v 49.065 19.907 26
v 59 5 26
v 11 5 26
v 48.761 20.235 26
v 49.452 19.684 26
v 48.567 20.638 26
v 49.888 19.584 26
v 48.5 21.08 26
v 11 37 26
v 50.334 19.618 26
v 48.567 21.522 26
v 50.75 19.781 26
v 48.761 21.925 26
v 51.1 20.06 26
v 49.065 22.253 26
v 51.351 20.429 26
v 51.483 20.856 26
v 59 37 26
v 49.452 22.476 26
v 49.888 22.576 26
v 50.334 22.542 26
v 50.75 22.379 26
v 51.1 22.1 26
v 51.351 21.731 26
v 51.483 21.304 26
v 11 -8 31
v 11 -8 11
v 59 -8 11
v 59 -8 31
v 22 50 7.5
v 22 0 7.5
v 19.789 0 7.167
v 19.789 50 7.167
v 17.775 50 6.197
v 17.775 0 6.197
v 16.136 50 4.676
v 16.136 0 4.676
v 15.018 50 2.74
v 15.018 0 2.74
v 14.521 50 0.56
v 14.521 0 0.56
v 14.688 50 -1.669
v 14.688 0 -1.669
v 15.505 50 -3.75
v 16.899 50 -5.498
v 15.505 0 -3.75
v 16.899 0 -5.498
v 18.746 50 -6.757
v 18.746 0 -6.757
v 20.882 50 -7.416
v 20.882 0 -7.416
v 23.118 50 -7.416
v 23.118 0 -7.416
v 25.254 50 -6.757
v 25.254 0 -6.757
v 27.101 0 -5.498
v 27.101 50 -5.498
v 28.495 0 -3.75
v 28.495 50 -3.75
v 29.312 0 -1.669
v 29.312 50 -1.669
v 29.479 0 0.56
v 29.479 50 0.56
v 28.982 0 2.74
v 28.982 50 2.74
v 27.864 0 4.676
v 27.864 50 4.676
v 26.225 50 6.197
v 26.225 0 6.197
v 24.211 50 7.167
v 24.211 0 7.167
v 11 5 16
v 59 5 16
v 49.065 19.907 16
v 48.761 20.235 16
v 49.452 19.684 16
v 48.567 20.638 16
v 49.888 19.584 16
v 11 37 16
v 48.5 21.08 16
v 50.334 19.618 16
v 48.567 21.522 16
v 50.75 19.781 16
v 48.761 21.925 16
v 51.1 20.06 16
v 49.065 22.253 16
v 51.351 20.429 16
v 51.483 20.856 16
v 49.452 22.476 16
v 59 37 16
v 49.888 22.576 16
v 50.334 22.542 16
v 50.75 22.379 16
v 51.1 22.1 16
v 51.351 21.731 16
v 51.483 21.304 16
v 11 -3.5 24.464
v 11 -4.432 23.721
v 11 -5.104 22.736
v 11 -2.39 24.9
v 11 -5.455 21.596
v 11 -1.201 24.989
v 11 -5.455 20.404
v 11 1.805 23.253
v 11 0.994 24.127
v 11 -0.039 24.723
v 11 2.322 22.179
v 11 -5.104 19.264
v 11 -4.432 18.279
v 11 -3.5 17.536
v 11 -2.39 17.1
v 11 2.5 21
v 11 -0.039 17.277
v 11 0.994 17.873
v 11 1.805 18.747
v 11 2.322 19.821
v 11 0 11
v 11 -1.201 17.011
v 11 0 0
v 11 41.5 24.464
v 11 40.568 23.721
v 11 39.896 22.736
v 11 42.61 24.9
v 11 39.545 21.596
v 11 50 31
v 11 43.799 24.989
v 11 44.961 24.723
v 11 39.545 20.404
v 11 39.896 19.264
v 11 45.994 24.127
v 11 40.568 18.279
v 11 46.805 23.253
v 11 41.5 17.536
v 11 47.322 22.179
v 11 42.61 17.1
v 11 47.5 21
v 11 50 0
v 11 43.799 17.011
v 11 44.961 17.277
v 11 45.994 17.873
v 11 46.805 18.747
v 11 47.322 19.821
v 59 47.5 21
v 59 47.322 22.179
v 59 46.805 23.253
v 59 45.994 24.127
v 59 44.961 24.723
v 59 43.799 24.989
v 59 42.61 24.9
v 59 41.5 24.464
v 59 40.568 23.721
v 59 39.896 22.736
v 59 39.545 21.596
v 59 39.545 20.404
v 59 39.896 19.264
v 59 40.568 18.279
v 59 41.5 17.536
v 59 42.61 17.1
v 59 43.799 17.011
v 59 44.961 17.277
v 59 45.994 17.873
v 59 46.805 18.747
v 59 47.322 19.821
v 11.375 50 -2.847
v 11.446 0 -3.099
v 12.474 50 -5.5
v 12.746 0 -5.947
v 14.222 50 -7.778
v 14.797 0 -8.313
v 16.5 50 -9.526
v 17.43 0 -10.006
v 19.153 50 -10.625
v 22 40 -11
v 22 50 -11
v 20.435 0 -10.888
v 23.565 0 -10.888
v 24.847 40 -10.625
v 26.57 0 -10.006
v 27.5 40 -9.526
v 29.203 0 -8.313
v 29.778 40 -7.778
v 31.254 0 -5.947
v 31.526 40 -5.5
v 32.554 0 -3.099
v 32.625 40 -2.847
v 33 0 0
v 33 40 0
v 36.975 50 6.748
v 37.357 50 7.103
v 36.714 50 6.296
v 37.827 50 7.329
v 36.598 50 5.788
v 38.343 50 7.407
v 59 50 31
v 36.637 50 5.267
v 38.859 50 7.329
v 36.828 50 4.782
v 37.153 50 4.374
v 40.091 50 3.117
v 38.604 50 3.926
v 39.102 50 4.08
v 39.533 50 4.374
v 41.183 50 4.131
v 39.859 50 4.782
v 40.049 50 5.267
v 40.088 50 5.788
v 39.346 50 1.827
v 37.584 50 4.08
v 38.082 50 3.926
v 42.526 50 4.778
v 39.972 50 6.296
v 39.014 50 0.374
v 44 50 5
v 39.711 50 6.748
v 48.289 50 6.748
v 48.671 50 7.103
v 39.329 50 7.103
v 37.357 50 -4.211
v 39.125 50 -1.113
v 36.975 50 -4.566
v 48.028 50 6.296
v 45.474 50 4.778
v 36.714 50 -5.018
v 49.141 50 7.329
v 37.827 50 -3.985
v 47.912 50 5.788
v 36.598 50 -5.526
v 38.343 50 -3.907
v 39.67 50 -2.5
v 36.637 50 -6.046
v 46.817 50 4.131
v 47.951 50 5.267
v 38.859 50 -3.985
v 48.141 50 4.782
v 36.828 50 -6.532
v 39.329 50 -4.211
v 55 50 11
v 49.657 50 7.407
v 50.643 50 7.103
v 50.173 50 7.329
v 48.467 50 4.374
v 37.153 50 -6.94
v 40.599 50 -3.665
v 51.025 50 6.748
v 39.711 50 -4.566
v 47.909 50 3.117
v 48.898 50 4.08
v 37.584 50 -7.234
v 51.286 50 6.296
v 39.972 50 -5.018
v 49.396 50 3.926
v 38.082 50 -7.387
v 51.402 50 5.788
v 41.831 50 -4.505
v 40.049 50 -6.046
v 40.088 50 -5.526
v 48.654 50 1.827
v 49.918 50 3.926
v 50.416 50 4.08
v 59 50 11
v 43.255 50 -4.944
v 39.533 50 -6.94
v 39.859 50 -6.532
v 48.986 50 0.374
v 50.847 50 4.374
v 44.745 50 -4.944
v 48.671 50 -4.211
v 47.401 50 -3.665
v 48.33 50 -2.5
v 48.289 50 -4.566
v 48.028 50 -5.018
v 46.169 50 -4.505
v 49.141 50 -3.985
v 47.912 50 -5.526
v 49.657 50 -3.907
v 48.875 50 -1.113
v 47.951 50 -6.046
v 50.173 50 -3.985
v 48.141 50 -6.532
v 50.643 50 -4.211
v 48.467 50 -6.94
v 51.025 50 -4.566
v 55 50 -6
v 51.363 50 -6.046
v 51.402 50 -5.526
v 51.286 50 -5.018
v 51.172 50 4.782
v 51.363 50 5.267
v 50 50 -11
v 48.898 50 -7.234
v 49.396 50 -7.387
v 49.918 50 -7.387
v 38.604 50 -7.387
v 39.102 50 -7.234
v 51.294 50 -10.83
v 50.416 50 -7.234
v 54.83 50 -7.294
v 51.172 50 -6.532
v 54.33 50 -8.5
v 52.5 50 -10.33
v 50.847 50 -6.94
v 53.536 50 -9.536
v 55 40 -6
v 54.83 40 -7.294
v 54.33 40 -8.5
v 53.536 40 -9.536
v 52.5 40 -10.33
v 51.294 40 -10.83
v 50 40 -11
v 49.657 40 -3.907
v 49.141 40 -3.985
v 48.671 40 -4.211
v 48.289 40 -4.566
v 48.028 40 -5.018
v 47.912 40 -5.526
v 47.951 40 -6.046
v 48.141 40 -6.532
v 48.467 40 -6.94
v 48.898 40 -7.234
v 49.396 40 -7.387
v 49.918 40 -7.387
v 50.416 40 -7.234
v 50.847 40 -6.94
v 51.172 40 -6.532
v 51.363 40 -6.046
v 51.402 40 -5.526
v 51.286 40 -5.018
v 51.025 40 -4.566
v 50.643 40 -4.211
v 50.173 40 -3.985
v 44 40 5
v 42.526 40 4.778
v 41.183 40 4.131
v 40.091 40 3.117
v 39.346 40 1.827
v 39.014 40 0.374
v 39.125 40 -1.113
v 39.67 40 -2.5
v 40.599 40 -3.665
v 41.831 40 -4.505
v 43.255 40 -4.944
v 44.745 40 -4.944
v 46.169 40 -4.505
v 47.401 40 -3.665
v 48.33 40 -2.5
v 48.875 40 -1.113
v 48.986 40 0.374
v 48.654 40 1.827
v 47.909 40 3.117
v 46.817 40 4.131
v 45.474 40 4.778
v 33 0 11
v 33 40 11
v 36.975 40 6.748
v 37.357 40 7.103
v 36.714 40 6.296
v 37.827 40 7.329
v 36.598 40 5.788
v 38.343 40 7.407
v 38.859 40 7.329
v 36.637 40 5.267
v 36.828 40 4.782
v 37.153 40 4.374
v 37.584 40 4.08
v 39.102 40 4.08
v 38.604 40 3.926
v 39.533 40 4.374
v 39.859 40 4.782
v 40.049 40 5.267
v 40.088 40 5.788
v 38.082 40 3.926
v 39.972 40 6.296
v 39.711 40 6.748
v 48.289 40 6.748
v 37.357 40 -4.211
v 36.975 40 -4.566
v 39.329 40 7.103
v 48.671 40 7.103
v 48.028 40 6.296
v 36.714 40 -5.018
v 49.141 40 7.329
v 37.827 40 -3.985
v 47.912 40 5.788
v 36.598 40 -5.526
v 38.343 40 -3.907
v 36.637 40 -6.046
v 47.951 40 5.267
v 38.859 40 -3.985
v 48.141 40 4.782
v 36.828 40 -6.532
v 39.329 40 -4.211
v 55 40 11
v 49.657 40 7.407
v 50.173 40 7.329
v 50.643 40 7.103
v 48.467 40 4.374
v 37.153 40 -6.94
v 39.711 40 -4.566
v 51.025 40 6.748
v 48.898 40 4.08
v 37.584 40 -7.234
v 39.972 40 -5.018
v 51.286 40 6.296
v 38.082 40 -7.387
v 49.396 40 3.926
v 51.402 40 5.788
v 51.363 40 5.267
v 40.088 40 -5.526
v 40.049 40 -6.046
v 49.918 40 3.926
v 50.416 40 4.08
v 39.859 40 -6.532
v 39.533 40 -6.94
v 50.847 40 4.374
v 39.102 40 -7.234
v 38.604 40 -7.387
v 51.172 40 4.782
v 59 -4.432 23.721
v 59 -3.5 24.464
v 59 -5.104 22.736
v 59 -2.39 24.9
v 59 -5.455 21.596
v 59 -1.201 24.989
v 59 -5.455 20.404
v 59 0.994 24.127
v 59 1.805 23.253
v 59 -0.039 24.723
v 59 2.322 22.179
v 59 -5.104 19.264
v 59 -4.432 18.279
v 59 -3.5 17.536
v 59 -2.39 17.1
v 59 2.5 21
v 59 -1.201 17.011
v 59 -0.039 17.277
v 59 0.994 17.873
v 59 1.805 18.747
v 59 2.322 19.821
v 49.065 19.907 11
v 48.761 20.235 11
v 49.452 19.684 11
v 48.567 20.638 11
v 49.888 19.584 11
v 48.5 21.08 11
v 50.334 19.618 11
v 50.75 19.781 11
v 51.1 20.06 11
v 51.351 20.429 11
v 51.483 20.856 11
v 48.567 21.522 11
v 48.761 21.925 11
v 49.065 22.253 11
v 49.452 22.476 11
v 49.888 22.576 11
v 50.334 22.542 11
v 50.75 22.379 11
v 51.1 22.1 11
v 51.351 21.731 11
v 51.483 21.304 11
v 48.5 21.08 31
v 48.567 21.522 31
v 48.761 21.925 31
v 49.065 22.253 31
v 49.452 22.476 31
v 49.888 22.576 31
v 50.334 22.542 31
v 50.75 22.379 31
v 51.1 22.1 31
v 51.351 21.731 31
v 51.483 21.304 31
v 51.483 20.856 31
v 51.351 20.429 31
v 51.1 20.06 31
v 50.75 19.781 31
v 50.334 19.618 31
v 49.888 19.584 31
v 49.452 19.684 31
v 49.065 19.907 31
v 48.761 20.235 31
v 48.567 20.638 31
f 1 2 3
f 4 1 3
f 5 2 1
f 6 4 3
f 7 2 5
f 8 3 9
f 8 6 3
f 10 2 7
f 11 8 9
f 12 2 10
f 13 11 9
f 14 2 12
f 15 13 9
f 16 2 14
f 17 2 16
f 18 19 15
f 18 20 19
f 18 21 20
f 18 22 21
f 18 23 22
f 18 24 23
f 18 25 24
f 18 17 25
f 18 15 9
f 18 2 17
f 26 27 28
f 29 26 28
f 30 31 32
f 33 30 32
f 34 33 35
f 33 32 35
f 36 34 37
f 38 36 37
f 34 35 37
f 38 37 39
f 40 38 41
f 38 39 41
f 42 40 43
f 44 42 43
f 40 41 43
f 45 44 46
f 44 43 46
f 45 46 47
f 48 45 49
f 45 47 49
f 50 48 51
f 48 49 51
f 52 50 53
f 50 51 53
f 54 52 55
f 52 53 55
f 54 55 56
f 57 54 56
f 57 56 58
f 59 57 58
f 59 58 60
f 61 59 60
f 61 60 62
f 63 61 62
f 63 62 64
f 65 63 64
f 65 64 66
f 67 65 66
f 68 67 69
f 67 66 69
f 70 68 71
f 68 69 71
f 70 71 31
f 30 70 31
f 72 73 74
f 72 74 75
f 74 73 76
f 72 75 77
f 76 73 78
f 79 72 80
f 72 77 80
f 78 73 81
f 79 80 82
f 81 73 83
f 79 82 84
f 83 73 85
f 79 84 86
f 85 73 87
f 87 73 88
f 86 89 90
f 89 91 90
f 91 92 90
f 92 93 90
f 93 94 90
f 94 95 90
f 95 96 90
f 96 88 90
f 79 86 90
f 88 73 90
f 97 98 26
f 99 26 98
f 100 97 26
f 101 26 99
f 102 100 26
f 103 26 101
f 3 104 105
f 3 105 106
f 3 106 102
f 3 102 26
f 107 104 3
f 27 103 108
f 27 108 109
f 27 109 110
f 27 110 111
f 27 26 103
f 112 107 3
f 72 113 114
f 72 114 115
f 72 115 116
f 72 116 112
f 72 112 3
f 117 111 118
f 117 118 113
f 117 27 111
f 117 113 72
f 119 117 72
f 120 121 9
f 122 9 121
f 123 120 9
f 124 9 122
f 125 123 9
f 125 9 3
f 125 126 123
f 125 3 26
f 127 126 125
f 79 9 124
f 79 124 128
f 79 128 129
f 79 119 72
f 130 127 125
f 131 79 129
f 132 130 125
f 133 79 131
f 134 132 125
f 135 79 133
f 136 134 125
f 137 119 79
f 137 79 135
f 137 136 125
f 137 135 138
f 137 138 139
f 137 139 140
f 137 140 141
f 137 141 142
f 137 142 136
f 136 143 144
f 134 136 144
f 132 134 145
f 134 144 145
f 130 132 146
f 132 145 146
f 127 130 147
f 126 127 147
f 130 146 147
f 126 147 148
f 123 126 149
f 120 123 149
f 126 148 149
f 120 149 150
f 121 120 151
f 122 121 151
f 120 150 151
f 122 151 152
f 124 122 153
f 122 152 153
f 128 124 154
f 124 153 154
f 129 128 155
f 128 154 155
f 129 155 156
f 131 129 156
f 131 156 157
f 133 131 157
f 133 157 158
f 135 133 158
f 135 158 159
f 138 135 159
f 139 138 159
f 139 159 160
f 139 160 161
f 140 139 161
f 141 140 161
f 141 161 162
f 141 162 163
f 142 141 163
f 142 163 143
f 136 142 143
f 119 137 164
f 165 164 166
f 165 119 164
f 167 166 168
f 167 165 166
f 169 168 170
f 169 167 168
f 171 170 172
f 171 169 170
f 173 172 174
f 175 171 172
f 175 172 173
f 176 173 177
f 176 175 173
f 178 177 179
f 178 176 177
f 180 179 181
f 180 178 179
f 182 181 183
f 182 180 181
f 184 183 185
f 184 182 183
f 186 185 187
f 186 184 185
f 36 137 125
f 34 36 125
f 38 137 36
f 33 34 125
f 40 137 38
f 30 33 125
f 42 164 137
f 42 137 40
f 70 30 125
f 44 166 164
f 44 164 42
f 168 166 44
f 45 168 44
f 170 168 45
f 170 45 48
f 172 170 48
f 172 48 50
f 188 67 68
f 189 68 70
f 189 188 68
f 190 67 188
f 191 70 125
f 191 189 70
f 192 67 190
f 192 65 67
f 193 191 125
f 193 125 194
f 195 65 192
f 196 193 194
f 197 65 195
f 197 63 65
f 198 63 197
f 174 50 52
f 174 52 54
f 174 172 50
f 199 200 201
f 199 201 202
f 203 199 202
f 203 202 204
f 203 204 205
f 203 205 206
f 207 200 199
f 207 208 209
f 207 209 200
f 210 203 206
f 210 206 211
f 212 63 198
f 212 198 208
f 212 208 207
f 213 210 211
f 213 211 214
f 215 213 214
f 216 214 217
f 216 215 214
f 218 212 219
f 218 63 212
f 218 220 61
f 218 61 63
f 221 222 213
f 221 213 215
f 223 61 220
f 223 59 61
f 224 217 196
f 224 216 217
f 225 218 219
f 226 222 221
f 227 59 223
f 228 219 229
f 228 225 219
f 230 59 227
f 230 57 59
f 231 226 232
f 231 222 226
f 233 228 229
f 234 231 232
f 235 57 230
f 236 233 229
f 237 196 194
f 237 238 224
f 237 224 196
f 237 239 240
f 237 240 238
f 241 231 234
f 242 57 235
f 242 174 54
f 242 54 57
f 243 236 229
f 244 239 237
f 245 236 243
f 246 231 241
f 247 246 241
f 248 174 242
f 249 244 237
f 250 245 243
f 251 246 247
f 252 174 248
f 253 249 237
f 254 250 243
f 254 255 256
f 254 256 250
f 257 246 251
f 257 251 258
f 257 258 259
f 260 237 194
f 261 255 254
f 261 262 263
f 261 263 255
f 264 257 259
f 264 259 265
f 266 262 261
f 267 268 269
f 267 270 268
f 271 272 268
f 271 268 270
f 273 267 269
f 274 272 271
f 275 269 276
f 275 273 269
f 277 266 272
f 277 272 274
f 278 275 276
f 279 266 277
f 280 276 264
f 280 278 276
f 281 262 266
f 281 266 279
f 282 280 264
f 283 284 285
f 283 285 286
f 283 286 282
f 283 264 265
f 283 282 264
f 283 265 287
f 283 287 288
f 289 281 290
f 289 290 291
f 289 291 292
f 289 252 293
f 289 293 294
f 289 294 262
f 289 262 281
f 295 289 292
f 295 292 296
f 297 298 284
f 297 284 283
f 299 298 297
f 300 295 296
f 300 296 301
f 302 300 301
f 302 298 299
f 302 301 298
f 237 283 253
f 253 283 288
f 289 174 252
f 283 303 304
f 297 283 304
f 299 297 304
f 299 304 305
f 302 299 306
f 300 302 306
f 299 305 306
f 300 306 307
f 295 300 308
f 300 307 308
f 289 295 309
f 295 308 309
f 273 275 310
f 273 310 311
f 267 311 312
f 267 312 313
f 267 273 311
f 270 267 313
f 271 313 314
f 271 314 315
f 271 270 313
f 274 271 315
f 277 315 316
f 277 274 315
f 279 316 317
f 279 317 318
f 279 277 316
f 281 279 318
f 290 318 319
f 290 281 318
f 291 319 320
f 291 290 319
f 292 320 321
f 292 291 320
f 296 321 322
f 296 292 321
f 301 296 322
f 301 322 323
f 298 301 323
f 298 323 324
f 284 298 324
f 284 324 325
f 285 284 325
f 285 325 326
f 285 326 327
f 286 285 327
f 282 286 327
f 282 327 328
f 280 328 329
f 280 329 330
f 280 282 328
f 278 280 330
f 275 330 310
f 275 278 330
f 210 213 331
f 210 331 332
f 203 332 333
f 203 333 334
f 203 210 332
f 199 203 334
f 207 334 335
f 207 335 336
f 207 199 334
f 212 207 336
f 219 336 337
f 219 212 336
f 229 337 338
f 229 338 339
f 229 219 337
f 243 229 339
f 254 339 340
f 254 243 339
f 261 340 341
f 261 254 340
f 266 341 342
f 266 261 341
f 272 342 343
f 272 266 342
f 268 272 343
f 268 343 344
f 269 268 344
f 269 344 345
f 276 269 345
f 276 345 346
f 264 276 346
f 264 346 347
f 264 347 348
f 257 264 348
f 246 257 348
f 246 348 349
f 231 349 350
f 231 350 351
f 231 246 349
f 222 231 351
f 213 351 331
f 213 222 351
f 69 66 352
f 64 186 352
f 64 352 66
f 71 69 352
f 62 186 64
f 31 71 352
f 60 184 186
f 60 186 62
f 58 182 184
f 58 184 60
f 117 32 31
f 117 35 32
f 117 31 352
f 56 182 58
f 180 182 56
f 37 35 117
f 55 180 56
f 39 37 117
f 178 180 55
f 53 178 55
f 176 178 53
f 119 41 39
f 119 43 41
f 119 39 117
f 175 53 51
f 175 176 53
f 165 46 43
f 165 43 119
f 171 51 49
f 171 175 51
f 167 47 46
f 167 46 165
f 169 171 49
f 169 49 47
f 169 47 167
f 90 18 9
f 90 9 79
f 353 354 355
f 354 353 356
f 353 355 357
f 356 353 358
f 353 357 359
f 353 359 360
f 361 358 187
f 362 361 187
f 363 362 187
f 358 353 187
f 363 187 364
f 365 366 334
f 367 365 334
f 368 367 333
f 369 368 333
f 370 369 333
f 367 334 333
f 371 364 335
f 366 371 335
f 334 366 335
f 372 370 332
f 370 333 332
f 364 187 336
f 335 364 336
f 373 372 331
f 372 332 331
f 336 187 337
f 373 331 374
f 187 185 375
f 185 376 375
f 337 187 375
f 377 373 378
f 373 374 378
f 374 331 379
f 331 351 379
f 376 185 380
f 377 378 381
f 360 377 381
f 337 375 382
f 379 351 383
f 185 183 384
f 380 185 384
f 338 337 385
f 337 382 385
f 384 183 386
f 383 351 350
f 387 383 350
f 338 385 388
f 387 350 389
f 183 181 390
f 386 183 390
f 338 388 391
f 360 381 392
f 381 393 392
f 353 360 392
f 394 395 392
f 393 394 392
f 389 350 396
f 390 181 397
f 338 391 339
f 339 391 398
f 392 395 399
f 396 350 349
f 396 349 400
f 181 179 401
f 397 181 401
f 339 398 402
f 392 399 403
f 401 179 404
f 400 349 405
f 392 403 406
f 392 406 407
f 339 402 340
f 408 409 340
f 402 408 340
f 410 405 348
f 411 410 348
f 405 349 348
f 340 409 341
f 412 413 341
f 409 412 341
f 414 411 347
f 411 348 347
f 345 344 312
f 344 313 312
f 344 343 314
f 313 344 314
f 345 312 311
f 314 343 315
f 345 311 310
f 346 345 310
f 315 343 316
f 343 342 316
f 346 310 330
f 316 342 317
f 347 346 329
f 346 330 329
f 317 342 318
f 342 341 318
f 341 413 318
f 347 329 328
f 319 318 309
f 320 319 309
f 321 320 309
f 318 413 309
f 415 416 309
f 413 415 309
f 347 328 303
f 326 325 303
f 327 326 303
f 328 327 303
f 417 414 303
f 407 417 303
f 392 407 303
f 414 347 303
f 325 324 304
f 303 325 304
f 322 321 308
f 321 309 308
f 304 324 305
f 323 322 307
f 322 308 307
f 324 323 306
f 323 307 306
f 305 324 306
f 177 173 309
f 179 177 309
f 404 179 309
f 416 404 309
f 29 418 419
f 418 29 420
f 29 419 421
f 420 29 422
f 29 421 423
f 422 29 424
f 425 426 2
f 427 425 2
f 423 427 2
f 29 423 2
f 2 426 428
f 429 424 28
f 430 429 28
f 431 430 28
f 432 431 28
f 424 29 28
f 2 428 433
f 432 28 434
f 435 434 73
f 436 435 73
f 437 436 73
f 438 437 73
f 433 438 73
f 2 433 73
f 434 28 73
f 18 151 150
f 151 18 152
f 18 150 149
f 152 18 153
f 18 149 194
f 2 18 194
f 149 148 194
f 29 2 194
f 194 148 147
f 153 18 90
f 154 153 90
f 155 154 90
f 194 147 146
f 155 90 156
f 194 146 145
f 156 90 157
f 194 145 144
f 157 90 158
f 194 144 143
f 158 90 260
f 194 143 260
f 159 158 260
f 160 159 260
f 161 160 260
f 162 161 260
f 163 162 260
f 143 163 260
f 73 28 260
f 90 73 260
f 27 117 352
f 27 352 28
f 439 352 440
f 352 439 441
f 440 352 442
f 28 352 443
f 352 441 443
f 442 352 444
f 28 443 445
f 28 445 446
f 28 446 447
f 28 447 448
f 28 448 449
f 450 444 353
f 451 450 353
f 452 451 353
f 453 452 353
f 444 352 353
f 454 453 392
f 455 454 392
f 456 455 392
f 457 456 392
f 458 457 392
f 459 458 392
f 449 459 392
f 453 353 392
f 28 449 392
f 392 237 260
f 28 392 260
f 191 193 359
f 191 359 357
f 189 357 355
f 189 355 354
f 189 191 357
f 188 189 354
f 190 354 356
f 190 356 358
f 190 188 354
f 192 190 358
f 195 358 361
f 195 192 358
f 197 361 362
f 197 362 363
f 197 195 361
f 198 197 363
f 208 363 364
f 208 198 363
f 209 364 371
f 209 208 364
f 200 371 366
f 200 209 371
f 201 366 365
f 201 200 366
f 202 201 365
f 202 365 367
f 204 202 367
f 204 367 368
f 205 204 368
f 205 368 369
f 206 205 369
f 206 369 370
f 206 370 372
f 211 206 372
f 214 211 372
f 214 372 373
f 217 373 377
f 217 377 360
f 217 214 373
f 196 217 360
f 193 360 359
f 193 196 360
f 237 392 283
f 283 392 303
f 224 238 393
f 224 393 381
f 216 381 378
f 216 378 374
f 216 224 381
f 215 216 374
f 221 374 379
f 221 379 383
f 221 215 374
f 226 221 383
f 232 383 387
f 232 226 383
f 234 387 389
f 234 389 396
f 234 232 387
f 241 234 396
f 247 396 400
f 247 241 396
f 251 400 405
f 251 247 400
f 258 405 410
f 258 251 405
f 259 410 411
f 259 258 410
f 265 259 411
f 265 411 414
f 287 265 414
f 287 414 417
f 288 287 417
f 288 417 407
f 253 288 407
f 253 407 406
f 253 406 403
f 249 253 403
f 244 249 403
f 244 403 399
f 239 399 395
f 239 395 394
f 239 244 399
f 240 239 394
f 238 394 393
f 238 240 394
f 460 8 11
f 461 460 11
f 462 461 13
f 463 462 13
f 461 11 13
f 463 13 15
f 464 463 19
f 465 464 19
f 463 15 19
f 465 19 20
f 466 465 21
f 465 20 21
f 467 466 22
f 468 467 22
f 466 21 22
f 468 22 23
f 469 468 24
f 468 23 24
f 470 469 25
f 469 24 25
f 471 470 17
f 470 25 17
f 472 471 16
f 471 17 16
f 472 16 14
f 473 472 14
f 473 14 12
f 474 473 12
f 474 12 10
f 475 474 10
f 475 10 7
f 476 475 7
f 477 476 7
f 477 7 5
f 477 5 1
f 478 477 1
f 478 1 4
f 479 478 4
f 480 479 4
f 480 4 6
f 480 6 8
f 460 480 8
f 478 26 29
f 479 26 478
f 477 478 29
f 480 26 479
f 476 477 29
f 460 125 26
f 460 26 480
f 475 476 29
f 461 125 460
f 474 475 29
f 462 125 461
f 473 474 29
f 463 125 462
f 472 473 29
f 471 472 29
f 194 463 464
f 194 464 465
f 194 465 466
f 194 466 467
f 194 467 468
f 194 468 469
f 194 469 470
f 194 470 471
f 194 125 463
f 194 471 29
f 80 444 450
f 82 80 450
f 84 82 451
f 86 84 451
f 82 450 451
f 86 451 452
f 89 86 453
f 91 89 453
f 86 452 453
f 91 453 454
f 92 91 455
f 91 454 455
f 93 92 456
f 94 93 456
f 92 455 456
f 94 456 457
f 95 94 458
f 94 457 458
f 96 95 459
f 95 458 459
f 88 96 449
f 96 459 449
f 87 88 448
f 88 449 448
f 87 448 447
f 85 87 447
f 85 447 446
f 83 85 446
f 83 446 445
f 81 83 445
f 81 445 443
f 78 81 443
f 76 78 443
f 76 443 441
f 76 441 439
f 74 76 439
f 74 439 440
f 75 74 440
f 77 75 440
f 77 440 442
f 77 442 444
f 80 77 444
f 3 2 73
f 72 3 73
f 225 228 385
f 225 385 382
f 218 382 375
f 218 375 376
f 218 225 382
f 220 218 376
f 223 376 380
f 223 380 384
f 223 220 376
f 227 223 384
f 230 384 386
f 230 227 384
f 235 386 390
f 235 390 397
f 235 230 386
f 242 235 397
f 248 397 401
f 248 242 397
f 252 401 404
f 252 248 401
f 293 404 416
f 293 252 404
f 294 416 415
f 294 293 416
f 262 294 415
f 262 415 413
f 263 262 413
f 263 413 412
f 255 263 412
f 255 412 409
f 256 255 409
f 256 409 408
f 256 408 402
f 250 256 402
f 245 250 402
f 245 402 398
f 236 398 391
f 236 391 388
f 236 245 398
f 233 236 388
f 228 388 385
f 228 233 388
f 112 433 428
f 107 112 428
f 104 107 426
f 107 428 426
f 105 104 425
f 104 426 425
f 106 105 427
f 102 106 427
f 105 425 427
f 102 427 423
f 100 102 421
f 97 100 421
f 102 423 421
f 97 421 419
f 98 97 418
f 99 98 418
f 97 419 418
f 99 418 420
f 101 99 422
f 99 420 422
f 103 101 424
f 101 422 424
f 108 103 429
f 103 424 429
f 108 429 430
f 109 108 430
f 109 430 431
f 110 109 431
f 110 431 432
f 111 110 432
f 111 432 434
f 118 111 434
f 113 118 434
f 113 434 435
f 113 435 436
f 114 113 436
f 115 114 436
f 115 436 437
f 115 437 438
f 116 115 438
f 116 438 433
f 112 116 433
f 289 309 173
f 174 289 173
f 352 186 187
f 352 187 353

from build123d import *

# Parameters (mm, degrees)
SKETCH_1_R          = 7.5
EXTRUDE_1_DEPTH     = 50
EXTRUDE_START       = -10
EXTRUDE_2_DEPTH     = 10
SKETCH_3_R          = 5
SKETCH_3_R_2        = 1.75
CUT_EXTRUDE_1_DEPTH = 10
SKETCH_4_W          = 44
SKETCH_4_H          = 22
CUT_EXTRUDE_2_DEPTH = 50
SKETCH_5_W          = 48
SKETCH_5_H          = 58
EXTRUDE_3_DEPTH     = 20
SKETCH_6_R          = 4
CUT_EXTRUDE_3_DEPTH = 50
SKETCH_7_W          = 10
SKETCH_7_H          = 32
CUT_EXTRUDE_4_DEPTH = 50
SKETCH_8_R          = 1.5
CUT_EXTRUDE_5_DEPTH = 20


with BuildPart() as part:
    # 草图1 → 凸台-拉伸1 (new body)
    with BuildSketch(Plane(origin=(0, 0, 0), x_dir=(1, 0, 0), z_dir=(0, 1, 0))):
        with BuildLine():
            Line((-11, 0), (-11, -11))
            Line((-11, -11), (11, -11))
            Line((11, -11), (11, 0))
            ThreePointArc((11, 0), (0, 11), (-11, 0))
        make_face()
        with Locations(Location((0, 0, 0), (0, 0, 270))):
            Circle(SKETCH_1_R, mode=Mode.SUBTRACT)
    extrude(amount=EXTRUDE_1_DEPTH)

    # 草图2 → 凸台-拉伸2 (add)
    with BuildSketch(Plane(origin=(0, 50, 0), x_dir=(1, 0, 0), z_dir=(0, 1, 0)).offset(EXTRUDE_START)):
        with BuildLine():
            Line((-11, 11), (0, 11))
            ThreePointArc((0, 11), (-7.778174593, 7.778174593), (-11, 0))
            Line((-11, 0), (-11, -11))
            Line((-11, -11), (-33, -11))
            Line((-33, -11), (-33, 6))
            ThreePointArc((-33, 6), (-31.535533906, 9.535533906), (-28, 11))
            Line((-28, 11), (-11, 11))
        make_face()
    extrude(amount=EXTRUDE_2_DEPTH)

    # 草图3 → 切除-拉伸1 (cut)
    with BuildSketch(Plane(origin=(0, 50, 0), x_dir=(1, 0, 0), z_dir=(0, 1, 0))):
        with Locations(Location((-22, 0, 0), (0, 0, 270))):
            Circle(SKETCH_3_R)
        with Locations(Location((-27.656854249, 5.656854249, 0), (0, 0, 270))):
            Circle(SKETCH_3_R_2)
        with Locations(Location((-16.343145751, 5.656854249, 0), (0, 0, 270))):
            Circle(SKETCH_3_R_2)
        with Locations(Location((-16.343145751, -5.656854249, 0), (0, 0, 270))):
            Circle(SKETCH_3_R_2)
        with Locations(Location((-27.656854249, -5.656854249, 0), (0, 0, 270))):
            Circle(SKETCH_3_R_2)
    extrude(amount=-CUT_EXTRUDE_1_DEPTH, mode=Mode.SUBTRACT)

    # 镜向1: part across plane


with BuildPart() as part_1:
    add(part.part)
    add(part.part.mirror(Plane(origin=(11, 50, 11), x_dir=(0, 0, 1), z_dir=(-1, 0, 0))))

    # 草图4 → 切除-拉伸2 (cut)
    with BuildSketch(Plane.XZ):
        with Locations((-11, 0)):
            Rectangle(SKETCH_4_W, SKETCH_4_H)
    extrude(amount=-CUT_EXTRUDE_2_DEPTH, mode=Mode.SUBTRACT)

    # 草图5 → 凸台-拉伸3 (add)
    with BuildSketch(Plane.XY.offset(11)):
        with Locations((35, 21)):
            Rectangle(SKETCH_5_W, SKETCH_5_H)
    extrude(amount=EXTRUDE_3_DEPTH)

    # 草图6 → 切除-拉伸3 (cut)
    with BuildSketch(Plane(origin=(59, 0, 0), x_dir=(0, 0, -1), z_dir=(1, 0, 0))):
        with Locations(Location((-21, 43.5, 0), (0, 0, 90))):
            Circle(SKETCH_6_R)
        with Locations(Location((-21, -1.5, 0), (0, 0, 90))):
            Circle(SKETCH_6_R)
    extrude(amount=-CUT_EXTRUDE_3_DEPTH, mode=Mode.SUBTRACT)

    # 草图7 → 切除-拉伸4 (cut)
    with BuildSketch(Plane(origin=(59, 0, 0), x_dir=(0, 0, -1), z_dir=(1, 0, 0))):
        with Locations((-21, 21)):
            Rectangle(SKETCH_7_W, SKETCH_7_H)
    extrude(amount=-CUT_EXTRUDE_4_DEPTH, mode=Mode.SUBTRACT)

    # 草图8 → 切除-拉伸5 (cut)
    with BuildSketch(Plane(origin=(0, 0, 11), x_dir=(-1, 0, 0), z_dir=(0, 0, -1))):
        with Locations((-50, 21.08)):
            Circle(SKETCH_8_R)
    extrude(amount=-CUT_EXTRUDE_5_DEPTH, mode=Mode.SUBTRACT)


solid = part_1.part
